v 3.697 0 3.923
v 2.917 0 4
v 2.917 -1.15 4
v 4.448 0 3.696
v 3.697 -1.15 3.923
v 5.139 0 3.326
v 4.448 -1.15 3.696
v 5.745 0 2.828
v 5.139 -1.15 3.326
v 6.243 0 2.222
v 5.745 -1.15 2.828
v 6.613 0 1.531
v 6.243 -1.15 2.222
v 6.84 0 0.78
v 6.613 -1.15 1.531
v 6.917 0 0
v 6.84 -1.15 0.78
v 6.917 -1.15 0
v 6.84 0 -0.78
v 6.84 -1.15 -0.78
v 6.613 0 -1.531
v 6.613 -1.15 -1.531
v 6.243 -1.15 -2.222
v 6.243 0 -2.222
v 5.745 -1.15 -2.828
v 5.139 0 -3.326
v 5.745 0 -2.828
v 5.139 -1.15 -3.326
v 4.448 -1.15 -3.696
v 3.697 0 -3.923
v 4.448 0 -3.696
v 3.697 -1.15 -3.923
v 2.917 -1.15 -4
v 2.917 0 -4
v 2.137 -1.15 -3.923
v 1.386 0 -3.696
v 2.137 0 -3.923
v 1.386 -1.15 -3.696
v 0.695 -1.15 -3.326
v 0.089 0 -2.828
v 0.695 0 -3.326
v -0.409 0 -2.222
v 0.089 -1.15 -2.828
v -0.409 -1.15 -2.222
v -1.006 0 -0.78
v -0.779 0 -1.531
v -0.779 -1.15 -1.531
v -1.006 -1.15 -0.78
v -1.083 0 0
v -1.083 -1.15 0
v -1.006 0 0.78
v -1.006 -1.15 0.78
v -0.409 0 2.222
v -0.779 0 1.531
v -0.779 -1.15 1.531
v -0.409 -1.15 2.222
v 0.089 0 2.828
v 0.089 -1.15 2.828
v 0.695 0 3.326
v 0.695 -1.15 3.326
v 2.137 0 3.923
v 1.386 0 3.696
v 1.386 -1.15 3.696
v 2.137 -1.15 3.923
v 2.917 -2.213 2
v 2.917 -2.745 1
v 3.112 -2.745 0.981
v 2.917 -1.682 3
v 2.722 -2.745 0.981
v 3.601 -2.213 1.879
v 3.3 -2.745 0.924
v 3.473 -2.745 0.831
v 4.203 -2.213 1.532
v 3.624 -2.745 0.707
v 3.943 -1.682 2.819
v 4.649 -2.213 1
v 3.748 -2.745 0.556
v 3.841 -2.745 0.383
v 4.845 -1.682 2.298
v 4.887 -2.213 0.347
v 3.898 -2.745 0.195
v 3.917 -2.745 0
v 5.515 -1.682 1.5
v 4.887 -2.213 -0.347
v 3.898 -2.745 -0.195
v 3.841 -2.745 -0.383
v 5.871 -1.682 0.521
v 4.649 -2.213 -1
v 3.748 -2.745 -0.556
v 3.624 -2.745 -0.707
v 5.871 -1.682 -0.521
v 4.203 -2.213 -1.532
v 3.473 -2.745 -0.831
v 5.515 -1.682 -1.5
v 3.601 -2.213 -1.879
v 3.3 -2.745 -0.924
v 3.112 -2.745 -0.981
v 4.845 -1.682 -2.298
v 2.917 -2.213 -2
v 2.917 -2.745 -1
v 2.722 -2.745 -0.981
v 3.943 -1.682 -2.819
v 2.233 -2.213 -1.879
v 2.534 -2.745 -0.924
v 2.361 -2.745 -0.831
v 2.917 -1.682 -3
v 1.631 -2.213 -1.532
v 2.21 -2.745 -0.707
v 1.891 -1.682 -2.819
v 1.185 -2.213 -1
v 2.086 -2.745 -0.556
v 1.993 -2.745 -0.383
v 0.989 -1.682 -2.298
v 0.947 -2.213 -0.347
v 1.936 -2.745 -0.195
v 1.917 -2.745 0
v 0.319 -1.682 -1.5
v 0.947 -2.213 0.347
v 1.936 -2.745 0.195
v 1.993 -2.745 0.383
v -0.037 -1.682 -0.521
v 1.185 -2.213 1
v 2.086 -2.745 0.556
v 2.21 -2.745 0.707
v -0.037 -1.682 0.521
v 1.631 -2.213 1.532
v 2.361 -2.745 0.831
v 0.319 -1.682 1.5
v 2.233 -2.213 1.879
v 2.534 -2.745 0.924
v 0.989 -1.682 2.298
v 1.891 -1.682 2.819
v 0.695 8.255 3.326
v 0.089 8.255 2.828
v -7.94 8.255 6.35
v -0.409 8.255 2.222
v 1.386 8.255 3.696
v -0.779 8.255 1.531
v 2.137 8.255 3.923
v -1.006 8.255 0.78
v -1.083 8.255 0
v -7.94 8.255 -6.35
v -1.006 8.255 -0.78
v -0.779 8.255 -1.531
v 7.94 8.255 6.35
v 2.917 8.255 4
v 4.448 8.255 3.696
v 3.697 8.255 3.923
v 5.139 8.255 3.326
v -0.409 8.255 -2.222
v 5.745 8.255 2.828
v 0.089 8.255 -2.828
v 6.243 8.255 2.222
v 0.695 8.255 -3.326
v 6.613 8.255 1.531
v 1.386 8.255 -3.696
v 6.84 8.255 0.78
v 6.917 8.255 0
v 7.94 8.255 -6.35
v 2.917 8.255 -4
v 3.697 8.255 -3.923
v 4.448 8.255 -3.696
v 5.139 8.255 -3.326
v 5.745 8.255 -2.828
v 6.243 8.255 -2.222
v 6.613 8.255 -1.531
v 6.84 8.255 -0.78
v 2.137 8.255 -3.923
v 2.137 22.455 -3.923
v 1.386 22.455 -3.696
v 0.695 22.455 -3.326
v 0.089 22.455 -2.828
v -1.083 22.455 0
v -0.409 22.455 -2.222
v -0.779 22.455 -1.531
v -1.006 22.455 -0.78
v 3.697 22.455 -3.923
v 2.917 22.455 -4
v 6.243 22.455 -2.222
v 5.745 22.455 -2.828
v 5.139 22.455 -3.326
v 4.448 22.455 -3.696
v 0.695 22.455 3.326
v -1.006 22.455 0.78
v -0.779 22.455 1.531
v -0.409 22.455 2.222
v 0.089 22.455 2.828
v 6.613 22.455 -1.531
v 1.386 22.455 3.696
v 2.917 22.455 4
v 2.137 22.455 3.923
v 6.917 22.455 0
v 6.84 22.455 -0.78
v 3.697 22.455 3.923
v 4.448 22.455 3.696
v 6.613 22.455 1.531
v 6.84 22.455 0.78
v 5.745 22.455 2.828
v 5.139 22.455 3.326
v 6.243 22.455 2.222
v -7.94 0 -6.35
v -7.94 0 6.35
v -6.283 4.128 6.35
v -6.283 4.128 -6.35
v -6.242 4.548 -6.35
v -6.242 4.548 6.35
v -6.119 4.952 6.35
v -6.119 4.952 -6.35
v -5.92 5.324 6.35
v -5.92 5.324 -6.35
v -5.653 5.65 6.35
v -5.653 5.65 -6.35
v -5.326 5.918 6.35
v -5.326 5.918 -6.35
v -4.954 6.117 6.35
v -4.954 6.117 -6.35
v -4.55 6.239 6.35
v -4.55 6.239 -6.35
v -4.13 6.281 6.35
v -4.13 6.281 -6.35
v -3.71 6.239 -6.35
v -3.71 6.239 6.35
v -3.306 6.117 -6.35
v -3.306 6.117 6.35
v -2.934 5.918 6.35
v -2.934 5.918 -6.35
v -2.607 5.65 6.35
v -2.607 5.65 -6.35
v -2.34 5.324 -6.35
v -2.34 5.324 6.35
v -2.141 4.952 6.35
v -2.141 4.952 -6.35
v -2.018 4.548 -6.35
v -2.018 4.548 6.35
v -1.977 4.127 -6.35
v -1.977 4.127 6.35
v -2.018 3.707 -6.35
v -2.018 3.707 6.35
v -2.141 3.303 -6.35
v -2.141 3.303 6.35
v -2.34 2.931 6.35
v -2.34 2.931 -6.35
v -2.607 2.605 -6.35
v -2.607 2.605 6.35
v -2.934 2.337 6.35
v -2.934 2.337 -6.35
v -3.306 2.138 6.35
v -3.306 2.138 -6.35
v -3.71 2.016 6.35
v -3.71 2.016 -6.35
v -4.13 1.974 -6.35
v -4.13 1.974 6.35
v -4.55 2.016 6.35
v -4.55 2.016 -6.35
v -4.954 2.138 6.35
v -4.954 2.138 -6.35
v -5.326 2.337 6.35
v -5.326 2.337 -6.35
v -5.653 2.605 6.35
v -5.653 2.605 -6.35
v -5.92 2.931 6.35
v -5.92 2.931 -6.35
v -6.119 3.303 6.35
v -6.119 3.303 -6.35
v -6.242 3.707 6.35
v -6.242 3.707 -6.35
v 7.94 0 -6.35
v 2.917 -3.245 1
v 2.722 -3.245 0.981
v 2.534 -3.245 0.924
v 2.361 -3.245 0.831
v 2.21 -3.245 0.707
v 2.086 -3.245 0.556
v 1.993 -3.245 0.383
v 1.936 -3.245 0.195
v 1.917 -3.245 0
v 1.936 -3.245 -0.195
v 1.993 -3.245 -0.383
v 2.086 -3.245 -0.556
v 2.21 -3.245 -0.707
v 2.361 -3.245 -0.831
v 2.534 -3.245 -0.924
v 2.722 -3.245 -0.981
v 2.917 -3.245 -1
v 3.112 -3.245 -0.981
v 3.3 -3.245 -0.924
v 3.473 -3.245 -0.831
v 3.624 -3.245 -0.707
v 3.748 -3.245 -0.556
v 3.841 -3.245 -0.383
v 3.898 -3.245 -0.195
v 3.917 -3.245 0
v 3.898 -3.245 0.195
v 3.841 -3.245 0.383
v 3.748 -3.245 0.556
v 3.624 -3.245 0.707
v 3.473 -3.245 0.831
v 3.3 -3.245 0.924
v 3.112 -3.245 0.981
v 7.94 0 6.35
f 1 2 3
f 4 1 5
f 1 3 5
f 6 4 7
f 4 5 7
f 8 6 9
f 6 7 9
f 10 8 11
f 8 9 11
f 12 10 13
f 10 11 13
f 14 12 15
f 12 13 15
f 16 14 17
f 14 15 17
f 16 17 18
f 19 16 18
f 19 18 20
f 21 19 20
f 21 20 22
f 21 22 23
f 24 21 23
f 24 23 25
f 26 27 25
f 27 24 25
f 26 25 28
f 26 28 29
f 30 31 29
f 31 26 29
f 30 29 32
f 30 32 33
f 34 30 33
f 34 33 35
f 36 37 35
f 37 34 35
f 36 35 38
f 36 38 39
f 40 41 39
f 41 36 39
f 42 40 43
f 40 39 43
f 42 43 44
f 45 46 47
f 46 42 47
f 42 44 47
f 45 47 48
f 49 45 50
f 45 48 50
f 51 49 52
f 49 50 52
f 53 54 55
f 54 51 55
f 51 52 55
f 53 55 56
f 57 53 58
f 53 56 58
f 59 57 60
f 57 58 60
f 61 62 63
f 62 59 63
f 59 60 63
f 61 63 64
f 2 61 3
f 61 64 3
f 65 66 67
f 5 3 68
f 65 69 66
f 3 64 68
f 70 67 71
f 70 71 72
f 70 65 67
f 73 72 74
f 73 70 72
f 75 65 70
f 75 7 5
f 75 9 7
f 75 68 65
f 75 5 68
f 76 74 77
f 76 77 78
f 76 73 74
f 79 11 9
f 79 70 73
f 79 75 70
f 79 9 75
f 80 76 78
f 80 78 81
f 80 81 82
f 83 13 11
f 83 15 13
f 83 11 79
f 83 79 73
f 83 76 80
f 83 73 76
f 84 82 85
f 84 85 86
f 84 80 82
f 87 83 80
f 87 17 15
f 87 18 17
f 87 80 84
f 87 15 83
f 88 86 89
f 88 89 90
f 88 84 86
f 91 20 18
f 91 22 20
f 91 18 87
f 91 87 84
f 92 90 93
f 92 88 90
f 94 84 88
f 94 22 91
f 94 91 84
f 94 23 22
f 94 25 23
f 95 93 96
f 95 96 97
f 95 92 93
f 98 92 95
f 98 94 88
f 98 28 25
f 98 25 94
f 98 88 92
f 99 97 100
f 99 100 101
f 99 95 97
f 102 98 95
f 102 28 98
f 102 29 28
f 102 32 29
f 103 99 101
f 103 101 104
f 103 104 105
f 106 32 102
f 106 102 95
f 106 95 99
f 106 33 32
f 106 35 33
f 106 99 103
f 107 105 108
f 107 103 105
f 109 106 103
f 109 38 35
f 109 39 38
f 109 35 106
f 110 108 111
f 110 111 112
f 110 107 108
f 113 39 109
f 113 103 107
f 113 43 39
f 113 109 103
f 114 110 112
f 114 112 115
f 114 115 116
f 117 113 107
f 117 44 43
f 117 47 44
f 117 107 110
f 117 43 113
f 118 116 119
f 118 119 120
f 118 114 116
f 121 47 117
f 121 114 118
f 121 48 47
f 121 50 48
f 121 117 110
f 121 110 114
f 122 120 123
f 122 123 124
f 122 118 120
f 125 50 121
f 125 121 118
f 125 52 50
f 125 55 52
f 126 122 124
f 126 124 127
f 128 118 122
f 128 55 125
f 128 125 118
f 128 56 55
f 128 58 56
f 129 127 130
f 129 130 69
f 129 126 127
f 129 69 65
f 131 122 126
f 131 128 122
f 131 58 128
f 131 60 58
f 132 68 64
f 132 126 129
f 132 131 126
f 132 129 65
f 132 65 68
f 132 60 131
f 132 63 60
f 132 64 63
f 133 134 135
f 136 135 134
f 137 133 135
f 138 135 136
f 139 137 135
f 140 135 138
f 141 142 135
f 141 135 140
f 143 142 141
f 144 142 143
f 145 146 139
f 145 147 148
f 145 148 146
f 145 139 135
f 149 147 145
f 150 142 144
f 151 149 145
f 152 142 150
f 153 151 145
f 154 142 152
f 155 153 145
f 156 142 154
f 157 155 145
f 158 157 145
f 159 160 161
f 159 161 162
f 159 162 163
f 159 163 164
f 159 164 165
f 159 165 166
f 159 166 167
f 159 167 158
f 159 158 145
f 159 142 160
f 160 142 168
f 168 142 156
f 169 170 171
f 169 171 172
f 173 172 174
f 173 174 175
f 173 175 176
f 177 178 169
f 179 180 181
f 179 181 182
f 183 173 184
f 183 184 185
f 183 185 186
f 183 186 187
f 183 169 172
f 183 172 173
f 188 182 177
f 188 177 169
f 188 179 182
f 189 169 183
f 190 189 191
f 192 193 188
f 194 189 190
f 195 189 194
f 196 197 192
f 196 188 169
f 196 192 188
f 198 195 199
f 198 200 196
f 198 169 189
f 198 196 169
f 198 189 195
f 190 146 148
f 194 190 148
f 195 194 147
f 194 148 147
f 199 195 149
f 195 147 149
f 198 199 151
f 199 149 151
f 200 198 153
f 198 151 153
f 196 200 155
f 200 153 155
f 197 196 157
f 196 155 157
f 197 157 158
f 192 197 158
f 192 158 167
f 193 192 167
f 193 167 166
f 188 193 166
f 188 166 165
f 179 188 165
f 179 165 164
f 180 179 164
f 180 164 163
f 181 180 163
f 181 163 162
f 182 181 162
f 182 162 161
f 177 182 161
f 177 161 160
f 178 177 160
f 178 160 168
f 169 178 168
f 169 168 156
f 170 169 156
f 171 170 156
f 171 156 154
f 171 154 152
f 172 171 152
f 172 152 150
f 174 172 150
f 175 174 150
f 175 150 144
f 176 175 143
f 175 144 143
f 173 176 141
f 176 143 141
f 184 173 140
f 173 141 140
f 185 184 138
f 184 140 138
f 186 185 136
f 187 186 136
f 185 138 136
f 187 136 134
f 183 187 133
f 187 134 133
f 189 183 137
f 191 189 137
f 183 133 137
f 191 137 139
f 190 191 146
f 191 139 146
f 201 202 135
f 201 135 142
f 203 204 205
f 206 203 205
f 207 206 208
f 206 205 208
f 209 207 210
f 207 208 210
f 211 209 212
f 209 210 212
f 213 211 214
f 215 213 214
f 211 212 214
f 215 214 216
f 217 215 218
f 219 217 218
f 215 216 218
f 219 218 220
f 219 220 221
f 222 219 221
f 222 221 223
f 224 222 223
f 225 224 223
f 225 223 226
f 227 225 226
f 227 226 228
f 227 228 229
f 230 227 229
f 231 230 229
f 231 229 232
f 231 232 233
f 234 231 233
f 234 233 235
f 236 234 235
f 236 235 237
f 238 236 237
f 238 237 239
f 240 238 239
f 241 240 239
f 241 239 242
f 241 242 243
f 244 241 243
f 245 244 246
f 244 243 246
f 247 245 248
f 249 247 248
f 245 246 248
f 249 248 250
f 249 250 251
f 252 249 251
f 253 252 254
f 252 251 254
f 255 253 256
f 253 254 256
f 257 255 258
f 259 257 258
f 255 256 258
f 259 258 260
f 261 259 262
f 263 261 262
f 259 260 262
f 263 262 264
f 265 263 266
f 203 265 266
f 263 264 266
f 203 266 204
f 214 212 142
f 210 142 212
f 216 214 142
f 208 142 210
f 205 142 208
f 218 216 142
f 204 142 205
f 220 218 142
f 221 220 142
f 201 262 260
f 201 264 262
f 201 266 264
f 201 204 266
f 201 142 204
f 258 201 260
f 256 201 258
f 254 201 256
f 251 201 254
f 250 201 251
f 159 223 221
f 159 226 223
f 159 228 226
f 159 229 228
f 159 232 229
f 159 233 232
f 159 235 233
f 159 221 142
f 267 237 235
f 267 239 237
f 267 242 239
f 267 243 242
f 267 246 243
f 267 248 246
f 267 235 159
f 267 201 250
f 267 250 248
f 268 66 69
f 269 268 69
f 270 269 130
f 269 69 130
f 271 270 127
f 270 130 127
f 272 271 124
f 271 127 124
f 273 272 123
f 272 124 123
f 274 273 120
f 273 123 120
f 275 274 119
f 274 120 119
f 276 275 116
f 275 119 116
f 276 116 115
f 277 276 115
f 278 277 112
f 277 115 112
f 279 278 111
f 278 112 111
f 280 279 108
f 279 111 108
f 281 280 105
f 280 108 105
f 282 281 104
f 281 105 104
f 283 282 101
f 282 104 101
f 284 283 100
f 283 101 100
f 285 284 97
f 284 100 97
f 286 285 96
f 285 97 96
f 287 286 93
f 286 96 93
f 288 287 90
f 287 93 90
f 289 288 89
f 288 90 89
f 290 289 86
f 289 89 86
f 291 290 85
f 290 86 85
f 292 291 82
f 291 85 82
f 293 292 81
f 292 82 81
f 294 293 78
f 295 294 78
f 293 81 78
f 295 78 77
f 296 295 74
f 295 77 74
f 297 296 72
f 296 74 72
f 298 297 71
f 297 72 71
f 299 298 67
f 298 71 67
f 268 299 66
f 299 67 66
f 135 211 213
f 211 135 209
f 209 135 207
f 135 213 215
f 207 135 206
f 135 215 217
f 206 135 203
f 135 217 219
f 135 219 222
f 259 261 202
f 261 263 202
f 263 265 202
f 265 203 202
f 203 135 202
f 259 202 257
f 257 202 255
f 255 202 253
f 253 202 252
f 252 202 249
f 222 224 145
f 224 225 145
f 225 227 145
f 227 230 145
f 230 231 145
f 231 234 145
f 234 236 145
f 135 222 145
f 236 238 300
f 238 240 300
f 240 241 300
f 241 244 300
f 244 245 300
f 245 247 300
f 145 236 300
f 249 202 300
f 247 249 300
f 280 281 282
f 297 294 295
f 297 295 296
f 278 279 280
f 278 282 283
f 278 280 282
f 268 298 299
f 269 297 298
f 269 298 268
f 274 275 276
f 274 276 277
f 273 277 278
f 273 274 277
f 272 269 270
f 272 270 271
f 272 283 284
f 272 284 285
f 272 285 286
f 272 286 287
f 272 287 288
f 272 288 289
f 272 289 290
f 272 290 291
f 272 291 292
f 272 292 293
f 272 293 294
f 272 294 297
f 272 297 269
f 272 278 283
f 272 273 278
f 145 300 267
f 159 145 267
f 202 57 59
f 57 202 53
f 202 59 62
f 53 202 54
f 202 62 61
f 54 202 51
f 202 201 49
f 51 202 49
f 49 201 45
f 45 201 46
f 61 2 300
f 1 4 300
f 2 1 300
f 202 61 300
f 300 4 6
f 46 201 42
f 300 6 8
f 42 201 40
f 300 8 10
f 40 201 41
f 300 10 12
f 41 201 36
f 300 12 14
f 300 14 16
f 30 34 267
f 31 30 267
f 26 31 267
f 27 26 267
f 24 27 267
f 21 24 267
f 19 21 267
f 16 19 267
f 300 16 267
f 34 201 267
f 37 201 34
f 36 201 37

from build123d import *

# Parameters (mm, degrees)
SKETCH1_W                = 15.88
SKETCH1_H                = 12.7
BOSS_EXTRUDE1_DEPTH      = 8.255
BOSS_EXTRUDE2_DEPTH      = 14.2
BOSS_EXTRUDE2_DEPTH_BACK = 11
SKETCH2_R                = 4
CHAMFER1_SIZE            = 3
CHAMFER1_SIZE2           = 1.595128295
SKETCH4_R                = 1
BOSS_EXTRUDE3_DEPTH      = 0.5
SKETCH5_R                = 2.153363707
CUT_EXTRUDE1_DEPTH       = 27.9918622


with BuildPart() as part:
    # Sketch1 → Boss-Extrude1 (new body)
    with BuildSketch(Plane(origin=(0, 0, 0), x_dir=(1, 0, 0), z_dir=(0, 1, 0))):
        Rectangle(SKETCH1_W, SKETCH1_H)
    extrude(amount=BOSS_EXTRUDE1_DEPTH)

    # Sketch2 → Boss-Extrude2 (add, two sides: drawn at the far end of the back side and taken through both)
    with BuildSketch(Plane(origin=(0, 8.255, 0), x_dir=(1, 0, 0), z_dir=(0, 1, 0)).offset(-BOSS_EXTRUDE2_DEPTH_BACK)):
        with Locations(Location((2.917, 0, 0), (0, 0, 270))):
            Circle(SKETCH2_R)
    extrude(amount=BOSS_EXTRUDE2_DEPTH + BOSS_EXTRUDE2_DEPTH_BACK)

    # Chamfer1
    chamfer1_edges = [part.edges().sort_by_distance(p)[0] for p in [
        (2.917, -2.745, -4),
    ]]
    chamfer1_side = [part.faces().sort_by_distance(p)[0] for p in [
        (2.917, -2.745, 0),
    ]]
    chamfer(chamfer1_edges, length=CHAMFER1_SIZE, length2=CHAMFER1_SIZE2, reference=chamfer1_side[0])

    # Sketch4 → Boss-Extrude3 (add)
    with BuildSketch(Plane.XZ.offset(2.745)):
        with Locations(Location((2.917, 0, 0), (0, 0, 90))):
            Circle(SKETCH4_R)
    extrude(amount=BOSS_EXTRUDE3_DEPTH)

    # Sketch5 → Cut-Extrude1 (cut, through all)
    with BuildSketch(Plane(origin=(0, 0, -6.35), x_dir=(-1, 0, 0), z_dir=(0, 0, -1))):
        with Locations((4.13, 4.1275)):
            Circle(SKETCH5_R)
    extrude(amount=-CUT_EXTRUDE1_DEPTH, mode=Mode.SUBTRACT)


solid = part.part
